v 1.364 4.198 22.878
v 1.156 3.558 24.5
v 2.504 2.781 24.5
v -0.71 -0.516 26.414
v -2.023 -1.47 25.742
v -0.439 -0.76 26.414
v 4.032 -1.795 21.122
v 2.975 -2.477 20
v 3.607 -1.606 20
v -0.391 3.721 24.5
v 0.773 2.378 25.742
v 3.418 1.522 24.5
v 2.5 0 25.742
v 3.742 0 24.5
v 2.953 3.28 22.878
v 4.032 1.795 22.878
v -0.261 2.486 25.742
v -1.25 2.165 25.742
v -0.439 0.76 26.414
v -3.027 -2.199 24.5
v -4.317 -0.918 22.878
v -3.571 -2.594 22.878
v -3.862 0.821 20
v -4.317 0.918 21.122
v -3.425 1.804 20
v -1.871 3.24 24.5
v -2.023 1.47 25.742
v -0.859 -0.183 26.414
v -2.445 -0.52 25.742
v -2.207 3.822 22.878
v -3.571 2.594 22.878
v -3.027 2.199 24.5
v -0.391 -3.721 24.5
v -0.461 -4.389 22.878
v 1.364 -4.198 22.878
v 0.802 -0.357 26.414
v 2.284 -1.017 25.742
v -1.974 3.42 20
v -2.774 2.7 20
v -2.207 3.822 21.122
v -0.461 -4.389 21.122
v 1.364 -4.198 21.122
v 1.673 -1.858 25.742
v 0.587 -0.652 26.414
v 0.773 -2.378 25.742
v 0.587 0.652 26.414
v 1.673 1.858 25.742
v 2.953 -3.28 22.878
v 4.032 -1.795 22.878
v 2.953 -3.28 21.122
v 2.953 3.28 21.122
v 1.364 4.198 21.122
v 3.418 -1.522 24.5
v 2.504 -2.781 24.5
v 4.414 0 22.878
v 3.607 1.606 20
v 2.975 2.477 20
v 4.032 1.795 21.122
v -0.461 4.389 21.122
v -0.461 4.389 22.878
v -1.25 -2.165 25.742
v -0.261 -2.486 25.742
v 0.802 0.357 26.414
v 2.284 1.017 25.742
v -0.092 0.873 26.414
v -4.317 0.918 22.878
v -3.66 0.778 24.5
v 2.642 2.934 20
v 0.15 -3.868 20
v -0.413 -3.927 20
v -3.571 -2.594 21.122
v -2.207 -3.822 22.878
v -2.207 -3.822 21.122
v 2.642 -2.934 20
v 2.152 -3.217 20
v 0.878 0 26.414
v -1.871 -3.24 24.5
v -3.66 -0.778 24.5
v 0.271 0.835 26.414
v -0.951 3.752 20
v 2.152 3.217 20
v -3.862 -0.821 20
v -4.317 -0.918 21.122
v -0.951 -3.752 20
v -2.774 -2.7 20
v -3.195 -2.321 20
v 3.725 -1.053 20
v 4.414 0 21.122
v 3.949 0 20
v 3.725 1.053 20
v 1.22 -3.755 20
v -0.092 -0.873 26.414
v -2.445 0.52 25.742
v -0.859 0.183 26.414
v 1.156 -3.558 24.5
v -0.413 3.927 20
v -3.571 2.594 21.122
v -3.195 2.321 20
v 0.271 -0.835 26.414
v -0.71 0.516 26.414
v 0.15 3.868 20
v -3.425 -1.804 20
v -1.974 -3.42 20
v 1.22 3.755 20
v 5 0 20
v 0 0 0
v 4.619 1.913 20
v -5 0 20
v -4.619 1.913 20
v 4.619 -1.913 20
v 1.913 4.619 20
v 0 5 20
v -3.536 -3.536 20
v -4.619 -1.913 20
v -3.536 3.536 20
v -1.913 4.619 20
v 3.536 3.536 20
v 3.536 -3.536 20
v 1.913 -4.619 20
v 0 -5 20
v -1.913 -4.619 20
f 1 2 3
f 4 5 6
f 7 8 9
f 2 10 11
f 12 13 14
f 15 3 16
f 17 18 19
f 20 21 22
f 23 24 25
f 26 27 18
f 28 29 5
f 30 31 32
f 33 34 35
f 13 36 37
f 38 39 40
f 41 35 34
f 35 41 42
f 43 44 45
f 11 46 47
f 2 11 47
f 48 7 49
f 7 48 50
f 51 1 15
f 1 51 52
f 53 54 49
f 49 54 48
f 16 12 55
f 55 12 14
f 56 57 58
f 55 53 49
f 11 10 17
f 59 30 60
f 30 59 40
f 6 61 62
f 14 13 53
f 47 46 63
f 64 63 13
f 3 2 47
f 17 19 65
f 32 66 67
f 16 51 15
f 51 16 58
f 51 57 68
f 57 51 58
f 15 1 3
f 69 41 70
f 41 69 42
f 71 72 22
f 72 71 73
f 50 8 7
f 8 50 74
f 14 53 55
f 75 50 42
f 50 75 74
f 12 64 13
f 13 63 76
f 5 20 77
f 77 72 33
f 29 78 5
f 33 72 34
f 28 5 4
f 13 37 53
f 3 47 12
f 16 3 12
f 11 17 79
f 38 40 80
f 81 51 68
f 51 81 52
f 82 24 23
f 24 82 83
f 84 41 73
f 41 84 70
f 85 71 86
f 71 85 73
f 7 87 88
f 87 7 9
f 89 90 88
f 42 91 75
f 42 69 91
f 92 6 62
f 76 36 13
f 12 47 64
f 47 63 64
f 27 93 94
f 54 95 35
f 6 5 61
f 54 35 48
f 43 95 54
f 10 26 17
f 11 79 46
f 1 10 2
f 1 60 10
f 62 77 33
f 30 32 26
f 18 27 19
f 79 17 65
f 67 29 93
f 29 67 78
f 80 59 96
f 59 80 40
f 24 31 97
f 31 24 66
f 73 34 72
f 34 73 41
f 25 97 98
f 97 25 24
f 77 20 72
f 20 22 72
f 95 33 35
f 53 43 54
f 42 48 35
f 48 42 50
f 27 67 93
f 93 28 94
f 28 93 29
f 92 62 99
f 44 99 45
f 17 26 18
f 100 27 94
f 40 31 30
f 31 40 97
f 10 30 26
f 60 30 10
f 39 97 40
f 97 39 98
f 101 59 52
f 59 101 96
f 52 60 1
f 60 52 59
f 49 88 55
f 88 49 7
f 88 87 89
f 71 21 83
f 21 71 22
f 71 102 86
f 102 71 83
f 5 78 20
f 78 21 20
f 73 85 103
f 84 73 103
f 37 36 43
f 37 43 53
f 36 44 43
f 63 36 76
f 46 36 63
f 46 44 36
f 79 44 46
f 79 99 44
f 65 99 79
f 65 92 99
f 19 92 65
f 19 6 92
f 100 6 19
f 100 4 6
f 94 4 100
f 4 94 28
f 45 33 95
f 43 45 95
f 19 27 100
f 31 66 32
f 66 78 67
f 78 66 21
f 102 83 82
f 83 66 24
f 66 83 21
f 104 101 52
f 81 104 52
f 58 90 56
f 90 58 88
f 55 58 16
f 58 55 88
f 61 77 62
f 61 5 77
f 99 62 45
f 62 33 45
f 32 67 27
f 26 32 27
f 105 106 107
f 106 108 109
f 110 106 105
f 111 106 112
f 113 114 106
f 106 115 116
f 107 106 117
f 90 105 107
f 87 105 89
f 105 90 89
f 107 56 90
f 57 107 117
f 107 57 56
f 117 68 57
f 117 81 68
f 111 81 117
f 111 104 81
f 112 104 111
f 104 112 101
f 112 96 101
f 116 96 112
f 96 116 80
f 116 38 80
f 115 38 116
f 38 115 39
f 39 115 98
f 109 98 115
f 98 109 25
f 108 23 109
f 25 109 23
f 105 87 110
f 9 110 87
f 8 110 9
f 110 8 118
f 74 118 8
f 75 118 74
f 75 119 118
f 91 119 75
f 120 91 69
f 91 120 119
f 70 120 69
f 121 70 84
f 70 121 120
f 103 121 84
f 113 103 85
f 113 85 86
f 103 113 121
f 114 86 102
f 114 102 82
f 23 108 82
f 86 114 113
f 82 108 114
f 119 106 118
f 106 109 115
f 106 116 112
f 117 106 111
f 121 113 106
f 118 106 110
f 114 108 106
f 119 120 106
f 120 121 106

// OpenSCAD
translate([0,0,22])
sphere(r=4.5);

cylinder(h=20, r1=0, r2=5);
